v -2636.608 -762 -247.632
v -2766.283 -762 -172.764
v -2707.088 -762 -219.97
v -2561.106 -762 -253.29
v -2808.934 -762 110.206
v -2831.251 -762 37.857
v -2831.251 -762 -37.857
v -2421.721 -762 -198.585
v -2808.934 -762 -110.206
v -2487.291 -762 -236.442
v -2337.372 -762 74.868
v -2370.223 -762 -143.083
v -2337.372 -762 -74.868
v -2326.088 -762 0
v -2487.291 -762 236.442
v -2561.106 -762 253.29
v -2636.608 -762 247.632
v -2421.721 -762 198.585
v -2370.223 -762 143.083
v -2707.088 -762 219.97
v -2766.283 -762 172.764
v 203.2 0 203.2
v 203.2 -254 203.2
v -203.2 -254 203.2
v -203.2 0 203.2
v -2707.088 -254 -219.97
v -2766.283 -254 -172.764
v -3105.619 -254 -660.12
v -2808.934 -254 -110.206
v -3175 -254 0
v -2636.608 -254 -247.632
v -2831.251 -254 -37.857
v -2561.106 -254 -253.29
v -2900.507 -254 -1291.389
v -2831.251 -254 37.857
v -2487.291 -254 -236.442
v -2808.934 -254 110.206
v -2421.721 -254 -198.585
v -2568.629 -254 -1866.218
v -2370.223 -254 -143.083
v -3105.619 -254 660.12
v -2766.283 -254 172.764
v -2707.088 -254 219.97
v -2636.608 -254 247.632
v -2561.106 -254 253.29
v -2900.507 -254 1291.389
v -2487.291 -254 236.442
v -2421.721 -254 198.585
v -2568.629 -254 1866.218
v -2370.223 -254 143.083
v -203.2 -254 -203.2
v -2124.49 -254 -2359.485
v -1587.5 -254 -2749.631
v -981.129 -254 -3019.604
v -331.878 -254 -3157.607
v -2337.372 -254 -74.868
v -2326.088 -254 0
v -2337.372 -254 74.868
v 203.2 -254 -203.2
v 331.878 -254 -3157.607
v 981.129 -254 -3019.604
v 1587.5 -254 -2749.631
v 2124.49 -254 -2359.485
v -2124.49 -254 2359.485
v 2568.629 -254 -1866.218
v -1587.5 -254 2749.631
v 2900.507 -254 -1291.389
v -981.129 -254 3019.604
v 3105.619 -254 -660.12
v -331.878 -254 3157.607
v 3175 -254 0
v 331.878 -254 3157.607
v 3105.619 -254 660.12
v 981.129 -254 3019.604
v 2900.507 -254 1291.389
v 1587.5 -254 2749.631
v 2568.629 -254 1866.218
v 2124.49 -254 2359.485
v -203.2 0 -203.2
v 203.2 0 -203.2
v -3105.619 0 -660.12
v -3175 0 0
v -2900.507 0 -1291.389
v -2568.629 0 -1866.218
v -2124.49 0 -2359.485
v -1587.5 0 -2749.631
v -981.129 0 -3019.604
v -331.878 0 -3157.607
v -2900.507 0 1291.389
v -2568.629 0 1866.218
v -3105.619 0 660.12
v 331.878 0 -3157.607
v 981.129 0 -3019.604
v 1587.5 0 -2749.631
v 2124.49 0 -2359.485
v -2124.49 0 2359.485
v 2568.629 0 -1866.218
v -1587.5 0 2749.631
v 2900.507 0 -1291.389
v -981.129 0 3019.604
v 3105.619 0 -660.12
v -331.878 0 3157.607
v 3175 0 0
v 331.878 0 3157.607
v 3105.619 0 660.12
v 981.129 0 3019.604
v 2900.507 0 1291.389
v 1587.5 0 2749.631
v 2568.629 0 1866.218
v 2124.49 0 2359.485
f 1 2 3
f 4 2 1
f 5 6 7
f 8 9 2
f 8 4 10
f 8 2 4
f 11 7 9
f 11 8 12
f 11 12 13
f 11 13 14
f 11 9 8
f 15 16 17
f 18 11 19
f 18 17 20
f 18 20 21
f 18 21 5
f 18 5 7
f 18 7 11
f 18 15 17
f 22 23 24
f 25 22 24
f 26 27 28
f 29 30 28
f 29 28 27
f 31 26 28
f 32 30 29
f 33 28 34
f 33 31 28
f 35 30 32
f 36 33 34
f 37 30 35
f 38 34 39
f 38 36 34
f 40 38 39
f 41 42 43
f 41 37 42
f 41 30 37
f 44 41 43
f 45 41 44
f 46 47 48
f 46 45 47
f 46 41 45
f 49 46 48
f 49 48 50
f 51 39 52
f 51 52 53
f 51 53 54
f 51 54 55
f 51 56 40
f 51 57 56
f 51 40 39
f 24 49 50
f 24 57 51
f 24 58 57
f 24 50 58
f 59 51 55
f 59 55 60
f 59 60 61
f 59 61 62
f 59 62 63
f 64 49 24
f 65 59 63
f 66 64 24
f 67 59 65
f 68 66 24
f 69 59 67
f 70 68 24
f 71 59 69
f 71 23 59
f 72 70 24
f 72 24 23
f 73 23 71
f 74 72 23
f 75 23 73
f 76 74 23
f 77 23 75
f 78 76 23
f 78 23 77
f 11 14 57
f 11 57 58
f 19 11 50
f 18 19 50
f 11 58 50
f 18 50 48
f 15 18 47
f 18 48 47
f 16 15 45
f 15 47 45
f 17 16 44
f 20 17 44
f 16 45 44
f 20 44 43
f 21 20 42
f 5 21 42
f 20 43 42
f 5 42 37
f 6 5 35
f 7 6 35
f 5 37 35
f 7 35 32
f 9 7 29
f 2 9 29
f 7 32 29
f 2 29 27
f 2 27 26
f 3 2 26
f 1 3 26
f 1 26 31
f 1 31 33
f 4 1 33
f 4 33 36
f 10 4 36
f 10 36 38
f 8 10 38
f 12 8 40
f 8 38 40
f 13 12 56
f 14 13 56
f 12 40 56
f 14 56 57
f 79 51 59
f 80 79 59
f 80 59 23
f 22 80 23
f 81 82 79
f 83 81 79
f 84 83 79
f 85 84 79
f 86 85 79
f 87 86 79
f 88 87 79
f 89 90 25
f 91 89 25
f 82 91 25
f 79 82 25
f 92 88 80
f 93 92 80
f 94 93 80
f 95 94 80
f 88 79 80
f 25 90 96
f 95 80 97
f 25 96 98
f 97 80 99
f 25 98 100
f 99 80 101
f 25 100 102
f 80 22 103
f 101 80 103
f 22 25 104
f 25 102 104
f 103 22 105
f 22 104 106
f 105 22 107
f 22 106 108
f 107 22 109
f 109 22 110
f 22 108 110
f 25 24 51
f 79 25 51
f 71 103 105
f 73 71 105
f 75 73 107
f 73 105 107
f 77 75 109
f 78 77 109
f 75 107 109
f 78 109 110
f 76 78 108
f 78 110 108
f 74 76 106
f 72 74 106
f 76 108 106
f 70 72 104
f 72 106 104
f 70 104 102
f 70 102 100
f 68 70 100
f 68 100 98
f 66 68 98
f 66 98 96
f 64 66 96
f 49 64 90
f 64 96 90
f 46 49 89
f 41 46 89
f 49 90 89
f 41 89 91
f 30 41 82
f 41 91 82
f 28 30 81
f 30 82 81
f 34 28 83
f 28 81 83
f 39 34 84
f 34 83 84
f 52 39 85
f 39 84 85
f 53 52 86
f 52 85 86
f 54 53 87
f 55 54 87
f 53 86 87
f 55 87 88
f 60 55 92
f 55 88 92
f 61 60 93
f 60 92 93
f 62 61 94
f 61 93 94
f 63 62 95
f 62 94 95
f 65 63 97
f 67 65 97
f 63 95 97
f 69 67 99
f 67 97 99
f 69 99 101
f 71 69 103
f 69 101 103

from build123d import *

# Parameters (mm, degrees)
F0_R     = 3175
F1_DEPTH = 254
F2_R     = 254
F3_DEPTH = 508
F5_DEPTH = 254


with BuildPart() as f1:
    # F0 (on Front) → F1 (new body)
    with BuildSketch(Plane.XZ):
        Circle(F0_R)
    extrude(amount=F1_DEPTH)

    # F2 (on face) → F3 (join)
    with BuildSketch(Plane.XZ.offset(254)):
        with Locations((-2580.087737, 0)):
            Circle(F2_R)
    extrude(amount=F3_DEPTH)

    # F4 (on face) → F5 (cut)
    with BuildSketch(Plane.XZ.offset(254)):
        Polygon((203.2, 203.2), (0, 203.2), (-203.2, 203.2), (-203.2, -203.2), (203.2, -203.2), align=None)
    extrude(amount=-F5_DEPTH, mode=Mode.SUBTRACT)


solid = f1.part
